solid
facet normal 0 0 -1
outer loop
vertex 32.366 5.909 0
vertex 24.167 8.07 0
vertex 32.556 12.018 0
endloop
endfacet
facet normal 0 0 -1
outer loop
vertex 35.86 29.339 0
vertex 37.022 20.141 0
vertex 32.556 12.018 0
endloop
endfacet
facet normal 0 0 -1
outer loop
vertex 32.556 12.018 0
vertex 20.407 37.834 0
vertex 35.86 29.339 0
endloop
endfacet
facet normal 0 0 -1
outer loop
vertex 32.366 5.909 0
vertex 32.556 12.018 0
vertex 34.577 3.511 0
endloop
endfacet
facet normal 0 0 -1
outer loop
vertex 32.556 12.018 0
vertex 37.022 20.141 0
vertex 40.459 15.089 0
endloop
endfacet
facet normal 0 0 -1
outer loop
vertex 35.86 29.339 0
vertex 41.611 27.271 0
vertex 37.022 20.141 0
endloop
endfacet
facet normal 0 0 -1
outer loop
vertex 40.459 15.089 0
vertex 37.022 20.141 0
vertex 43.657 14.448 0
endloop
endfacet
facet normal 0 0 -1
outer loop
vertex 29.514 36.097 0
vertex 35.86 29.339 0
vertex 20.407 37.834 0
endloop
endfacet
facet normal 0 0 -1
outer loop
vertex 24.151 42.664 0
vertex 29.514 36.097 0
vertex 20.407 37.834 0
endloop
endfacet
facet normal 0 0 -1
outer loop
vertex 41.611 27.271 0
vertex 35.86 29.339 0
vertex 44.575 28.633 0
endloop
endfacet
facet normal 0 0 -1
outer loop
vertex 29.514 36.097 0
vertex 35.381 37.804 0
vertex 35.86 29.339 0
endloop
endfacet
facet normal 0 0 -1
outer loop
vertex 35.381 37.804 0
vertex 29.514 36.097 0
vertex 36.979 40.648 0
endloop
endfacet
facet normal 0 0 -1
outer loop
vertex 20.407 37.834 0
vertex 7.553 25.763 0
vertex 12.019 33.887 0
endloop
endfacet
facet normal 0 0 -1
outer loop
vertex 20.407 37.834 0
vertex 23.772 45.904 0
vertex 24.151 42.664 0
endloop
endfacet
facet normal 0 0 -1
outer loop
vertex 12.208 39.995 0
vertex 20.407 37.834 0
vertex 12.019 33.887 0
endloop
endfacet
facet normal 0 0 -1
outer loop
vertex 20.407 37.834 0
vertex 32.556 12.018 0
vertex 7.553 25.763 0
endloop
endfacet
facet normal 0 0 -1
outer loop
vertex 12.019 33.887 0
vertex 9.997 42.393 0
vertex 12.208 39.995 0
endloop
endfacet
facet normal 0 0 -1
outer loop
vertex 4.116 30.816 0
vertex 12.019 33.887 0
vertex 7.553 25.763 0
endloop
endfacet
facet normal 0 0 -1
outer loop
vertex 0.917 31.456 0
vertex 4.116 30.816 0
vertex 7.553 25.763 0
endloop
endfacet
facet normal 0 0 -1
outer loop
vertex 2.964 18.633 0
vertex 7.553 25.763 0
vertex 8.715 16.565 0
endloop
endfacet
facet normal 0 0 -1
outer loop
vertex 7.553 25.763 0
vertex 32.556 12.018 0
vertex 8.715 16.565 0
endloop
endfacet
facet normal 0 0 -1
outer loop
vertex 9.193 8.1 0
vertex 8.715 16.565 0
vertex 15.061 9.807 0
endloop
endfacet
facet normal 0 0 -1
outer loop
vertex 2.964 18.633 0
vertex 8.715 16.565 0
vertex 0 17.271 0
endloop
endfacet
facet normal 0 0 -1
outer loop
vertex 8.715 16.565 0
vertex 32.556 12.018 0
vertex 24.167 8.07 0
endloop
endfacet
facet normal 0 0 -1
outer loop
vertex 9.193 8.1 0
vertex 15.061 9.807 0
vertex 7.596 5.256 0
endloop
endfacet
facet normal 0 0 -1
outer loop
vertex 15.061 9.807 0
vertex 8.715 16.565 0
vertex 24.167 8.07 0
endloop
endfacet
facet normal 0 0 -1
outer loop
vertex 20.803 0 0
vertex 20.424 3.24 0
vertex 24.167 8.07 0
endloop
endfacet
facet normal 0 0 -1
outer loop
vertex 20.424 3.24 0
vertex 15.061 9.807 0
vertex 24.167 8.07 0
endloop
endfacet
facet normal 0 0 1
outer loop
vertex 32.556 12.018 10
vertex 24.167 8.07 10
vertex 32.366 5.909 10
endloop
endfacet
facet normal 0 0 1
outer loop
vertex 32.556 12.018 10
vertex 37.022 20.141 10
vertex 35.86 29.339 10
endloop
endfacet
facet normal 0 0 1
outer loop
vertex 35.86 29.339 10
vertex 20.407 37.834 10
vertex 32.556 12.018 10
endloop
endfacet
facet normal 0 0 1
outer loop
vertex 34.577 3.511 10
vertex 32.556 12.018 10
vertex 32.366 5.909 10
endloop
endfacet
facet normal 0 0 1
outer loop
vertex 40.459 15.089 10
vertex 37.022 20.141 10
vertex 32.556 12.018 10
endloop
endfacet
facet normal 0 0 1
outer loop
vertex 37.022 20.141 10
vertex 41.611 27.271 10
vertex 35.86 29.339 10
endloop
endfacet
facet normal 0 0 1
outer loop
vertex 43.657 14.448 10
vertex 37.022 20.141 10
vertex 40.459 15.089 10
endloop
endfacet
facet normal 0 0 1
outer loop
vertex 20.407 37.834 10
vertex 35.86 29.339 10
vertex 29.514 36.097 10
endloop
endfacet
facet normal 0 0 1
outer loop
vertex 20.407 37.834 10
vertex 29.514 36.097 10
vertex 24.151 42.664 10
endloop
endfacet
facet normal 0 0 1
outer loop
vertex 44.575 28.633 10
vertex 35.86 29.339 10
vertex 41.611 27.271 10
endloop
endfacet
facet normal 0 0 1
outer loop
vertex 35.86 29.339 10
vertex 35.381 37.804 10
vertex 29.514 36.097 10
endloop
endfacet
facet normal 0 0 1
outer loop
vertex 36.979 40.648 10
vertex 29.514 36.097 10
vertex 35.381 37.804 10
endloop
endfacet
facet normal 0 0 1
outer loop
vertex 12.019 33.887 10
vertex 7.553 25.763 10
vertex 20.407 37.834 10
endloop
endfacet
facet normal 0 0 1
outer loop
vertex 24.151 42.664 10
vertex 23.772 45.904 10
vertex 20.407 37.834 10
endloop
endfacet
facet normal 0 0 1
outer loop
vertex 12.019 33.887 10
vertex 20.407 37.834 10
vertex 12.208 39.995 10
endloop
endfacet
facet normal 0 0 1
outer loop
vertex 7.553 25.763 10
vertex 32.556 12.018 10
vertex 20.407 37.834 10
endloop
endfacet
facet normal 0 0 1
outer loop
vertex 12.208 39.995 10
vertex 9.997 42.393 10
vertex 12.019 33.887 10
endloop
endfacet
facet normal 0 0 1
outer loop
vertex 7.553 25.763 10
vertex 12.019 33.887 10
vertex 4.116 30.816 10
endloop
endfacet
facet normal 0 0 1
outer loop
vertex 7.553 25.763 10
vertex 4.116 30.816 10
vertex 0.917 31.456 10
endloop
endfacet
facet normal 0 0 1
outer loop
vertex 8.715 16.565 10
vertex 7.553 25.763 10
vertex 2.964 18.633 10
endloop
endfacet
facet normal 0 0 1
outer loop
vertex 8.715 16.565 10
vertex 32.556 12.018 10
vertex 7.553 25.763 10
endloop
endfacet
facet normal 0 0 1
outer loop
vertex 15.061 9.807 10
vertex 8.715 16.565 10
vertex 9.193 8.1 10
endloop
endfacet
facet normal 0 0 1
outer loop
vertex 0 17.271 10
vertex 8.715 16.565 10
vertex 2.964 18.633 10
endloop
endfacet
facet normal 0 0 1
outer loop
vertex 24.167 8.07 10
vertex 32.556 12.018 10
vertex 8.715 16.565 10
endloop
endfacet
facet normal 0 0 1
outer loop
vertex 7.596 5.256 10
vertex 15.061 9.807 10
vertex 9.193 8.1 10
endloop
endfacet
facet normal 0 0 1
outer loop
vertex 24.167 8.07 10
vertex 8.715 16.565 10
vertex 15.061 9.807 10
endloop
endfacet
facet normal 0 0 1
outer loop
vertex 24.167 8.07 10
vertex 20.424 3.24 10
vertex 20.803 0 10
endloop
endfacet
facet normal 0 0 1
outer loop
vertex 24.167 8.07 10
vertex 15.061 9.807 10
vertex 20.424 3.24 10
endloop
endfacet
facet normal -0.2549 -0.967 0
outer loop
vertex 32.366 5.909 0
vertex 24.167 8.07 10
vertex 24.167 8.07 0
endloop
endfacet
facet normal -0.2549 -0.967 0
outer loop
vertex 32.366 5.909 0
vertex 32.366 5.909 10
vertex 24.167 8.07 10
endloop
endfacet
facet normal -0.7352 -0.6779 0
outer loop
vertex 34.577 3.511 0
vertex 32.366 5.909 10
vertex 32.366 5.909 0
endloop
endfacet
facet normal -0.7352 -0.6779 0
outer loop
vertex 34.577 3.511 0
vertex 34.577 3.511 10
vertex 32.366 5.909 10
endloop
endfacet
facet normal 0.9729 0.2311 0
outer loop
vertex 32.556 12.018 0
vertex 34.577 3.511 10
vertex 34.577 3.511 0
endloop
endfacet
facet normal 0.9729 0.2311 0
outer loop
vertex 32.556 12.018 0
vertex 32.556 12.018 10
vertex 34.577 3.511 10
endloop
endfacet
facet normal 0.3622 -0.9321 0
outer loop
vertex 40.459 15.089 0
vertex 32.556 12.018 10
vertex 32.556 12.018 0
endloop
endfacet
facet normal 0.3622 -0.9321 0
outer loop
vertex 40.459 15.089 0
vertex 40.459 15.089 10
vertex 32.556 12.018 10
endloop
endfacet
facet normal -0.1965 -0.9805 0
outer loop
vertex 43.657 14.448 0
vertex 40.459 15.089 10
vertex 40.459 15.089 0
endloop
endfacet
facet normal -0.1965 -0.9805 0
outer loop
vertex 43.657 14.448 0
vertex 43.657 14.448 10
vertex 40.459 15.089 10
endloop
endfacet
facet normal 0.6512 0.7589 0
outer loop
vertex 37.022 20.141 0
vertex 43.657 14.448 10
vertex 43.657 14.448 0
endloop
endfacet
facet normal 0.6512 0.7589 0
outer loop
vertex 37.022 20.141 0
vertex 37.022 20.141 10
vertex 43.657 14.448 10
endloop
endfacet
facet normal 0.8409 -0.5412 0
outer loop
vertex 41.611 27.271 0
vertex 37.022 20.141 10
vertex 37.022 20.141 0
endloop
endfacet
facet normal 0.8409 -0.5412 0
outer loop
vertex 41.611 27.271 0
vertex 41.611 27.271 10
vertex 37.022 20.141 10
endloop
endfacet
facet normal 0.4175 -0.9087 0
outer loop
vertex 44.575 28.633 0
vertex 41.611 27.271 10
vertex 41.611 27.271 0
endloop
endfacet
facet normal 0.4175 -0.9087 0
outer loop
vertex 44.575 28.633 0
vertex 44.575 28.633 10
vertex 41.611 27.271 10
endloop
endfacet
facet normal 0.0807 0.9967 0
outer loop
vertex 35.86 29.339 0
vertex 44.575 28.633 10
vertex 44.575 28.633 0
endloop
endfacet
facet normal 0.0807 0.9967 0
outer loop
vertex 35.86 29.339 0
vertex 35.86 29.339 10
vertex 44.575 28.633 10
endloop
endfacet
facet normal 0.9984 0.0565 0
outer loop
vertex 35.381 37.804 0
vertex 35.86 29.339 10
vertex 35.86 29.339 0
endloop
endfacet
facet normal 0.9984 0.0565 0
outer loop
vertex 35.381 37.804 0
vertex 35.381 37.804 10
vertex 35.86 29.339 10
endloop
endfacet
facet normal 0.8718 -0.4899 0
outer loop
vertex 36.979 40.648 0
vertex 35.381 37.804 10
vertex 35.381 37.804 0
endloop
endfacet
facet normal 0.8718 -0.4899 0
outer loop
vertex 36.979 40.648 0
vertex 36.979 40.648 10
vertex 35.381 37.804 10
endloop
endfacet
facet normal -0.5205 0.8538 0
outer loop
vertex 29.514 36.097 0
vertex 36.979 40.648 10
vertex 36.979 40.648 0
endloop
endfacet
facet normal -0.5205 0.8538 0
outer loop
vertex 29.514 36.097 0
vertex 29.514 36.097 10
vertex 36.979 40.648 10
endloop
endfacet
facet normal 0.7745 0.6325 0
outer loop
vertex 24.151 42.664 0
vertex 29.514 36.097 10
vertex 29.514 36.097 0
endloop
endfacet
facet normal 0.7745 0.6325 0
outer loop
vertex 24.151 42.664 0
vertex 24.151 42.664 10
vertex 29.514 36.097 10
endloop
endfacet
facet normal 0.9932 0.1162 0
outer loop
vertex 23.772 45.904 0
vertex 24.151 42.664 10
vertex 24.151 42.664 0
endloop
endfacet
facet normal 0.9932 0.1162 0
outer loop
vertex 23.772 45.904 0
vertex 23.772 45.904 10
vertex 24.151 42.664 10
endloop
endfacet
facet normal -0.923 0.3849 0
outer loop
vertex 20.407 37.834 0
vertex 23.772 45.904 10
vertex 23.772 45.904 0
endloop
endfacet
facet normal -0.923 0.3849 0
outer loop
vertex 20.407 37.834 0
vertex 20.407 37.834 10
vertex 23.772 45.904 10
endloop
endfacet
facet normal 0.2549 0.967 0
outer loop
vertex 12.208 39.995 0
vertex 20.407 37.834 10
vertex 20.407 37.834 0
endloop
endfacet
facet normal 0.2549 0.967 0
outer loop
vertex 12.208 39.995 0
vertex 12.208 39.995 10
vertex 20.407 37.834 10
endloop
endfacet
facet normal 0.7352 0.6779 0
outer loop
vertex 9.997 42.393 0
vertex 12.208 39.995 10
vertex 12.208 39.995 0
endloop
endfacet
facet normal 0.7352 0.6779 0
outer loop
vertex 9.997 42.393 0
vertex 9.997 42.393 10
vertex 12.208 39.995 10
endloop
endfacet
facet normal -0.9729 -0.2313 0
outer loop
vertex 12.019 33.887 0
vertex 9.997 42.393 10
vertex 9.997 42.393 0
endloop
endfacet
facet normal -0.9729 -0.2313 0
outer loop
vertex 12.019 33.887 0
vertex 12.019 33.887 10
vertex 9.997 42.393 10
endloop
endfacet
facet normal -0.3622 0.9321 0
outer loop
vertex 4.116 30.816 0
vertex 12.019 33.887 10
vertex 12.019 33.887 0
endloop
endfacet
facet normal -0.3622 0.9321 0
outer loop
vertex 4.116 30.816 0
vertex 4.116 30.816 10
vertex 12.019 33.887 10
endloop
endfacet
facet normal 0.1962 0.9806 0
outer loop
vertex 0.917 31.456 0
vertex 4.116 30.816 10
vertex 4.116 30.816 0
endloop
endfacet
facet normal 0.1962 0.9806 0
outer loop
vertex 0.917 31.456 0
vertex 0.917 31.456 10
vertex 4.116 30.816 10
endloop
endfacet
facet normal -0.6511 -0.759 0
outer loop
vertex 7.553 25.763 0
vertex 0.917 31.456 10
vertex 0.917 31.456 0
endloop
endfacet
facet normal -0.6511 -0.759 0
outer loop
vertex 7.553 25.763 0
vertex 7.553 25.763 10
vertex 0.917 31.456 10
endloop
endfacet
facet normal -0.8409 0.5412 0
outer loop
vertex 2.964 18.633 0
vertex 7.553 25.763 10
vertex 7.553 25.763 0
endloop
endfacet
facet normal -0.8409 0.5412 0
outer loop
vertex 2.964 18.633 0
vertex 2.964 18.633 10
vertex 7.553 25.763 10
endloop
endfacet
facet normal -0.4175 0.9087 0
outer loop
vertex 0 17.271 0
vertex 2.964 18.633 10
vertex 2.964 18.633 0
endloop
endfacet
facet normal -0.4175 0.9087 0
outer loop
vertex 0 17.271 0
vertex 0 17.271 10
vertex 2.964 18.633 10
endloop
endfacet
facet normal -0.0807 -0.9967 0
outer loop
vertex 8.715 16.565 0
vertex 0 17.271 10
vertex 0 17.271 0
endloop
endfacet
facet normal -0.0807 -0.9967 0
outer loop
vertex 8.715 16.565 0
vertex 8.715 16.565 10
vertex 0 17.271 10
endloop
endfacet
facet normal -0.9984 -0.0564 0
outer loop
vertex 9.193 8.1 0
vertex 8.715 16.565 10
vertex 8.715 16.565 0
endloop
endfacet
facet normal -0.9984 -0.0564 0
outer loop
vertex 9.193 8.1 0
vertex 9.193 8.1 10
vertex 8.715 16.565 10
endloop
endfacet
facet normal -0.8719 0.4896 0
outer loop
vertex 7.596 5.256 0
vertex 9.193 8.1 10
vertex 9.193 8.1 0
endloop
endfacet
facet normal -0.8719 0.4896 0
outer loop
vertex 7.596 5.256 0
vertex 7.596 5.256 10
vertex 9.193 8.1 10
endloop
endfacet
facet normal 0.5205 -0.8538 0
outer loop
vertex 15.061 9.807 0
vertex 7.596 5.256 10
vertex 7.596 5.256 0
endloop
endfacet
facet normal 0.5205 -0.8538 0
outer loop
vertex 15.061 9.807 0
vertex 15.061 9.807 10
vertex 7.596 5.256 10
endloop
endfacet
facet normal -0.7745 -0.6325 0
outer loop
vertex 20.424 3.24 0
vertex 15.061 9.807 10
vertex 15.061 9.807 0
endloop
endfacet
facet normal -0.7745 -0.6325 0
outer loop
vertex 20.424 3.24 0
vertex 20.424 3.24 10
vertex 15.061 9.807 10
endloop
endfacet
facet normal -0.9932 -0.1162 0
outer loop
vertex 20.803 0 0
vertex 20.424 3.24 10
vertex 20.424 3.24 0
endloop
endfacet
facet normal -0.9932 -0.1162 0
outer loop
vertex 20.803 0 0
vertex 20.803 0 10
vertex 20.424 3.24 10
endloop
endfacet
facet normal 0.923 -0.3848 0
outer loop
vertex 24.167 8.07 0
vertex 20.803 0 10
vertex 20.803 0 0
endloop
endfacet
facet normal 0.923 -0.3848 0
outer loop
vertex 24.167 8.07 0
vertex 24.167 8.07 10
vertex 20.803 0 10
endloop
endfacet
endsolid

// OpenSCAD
$fn = 32;

// ----------------------------------------------------------------------
// Fan rotor section: 10 blades, 15 mm hub radius, 8 mm blades
// ----------------------------------------------------------------------

// --- parameters (mm) ---
profile_height = 10;      // extrusion height
profile_points = 30;      // points of the closed outline

profile = [[37.022, 20.141], [41.611, 27.271], [44.575, 28.633], [35.86, 29.339], [35.381, 37.804], [36.979, 40.648], [29.514, 36.097], [24.151, 42.664], [23.772, 45.904], [20.407, 37.834], [12.208, 39.995], [9.997, 42.393], [12.019, 33.887], [4.116, 30.816], [0.917, 31.456], [7.553, 25.763], [2.964, 18.633], [0, 17.271], [8.715, 16.565], [9.193, 8.1], [7.596, 5.256], [15.061, 9.807], [20.424, 3.24], [20.803, 0], [24.167, 8.07], [32.366, 5.909], [34.577, 3.511], [32.556, 12.018], [40.459, 15.089], [43.657, 14.448]];  // single closed polygon, 30 points, counter clockwise

// --- the one profile operation ---
linear_extrude(height = profile_height) polygon(points = profile);
